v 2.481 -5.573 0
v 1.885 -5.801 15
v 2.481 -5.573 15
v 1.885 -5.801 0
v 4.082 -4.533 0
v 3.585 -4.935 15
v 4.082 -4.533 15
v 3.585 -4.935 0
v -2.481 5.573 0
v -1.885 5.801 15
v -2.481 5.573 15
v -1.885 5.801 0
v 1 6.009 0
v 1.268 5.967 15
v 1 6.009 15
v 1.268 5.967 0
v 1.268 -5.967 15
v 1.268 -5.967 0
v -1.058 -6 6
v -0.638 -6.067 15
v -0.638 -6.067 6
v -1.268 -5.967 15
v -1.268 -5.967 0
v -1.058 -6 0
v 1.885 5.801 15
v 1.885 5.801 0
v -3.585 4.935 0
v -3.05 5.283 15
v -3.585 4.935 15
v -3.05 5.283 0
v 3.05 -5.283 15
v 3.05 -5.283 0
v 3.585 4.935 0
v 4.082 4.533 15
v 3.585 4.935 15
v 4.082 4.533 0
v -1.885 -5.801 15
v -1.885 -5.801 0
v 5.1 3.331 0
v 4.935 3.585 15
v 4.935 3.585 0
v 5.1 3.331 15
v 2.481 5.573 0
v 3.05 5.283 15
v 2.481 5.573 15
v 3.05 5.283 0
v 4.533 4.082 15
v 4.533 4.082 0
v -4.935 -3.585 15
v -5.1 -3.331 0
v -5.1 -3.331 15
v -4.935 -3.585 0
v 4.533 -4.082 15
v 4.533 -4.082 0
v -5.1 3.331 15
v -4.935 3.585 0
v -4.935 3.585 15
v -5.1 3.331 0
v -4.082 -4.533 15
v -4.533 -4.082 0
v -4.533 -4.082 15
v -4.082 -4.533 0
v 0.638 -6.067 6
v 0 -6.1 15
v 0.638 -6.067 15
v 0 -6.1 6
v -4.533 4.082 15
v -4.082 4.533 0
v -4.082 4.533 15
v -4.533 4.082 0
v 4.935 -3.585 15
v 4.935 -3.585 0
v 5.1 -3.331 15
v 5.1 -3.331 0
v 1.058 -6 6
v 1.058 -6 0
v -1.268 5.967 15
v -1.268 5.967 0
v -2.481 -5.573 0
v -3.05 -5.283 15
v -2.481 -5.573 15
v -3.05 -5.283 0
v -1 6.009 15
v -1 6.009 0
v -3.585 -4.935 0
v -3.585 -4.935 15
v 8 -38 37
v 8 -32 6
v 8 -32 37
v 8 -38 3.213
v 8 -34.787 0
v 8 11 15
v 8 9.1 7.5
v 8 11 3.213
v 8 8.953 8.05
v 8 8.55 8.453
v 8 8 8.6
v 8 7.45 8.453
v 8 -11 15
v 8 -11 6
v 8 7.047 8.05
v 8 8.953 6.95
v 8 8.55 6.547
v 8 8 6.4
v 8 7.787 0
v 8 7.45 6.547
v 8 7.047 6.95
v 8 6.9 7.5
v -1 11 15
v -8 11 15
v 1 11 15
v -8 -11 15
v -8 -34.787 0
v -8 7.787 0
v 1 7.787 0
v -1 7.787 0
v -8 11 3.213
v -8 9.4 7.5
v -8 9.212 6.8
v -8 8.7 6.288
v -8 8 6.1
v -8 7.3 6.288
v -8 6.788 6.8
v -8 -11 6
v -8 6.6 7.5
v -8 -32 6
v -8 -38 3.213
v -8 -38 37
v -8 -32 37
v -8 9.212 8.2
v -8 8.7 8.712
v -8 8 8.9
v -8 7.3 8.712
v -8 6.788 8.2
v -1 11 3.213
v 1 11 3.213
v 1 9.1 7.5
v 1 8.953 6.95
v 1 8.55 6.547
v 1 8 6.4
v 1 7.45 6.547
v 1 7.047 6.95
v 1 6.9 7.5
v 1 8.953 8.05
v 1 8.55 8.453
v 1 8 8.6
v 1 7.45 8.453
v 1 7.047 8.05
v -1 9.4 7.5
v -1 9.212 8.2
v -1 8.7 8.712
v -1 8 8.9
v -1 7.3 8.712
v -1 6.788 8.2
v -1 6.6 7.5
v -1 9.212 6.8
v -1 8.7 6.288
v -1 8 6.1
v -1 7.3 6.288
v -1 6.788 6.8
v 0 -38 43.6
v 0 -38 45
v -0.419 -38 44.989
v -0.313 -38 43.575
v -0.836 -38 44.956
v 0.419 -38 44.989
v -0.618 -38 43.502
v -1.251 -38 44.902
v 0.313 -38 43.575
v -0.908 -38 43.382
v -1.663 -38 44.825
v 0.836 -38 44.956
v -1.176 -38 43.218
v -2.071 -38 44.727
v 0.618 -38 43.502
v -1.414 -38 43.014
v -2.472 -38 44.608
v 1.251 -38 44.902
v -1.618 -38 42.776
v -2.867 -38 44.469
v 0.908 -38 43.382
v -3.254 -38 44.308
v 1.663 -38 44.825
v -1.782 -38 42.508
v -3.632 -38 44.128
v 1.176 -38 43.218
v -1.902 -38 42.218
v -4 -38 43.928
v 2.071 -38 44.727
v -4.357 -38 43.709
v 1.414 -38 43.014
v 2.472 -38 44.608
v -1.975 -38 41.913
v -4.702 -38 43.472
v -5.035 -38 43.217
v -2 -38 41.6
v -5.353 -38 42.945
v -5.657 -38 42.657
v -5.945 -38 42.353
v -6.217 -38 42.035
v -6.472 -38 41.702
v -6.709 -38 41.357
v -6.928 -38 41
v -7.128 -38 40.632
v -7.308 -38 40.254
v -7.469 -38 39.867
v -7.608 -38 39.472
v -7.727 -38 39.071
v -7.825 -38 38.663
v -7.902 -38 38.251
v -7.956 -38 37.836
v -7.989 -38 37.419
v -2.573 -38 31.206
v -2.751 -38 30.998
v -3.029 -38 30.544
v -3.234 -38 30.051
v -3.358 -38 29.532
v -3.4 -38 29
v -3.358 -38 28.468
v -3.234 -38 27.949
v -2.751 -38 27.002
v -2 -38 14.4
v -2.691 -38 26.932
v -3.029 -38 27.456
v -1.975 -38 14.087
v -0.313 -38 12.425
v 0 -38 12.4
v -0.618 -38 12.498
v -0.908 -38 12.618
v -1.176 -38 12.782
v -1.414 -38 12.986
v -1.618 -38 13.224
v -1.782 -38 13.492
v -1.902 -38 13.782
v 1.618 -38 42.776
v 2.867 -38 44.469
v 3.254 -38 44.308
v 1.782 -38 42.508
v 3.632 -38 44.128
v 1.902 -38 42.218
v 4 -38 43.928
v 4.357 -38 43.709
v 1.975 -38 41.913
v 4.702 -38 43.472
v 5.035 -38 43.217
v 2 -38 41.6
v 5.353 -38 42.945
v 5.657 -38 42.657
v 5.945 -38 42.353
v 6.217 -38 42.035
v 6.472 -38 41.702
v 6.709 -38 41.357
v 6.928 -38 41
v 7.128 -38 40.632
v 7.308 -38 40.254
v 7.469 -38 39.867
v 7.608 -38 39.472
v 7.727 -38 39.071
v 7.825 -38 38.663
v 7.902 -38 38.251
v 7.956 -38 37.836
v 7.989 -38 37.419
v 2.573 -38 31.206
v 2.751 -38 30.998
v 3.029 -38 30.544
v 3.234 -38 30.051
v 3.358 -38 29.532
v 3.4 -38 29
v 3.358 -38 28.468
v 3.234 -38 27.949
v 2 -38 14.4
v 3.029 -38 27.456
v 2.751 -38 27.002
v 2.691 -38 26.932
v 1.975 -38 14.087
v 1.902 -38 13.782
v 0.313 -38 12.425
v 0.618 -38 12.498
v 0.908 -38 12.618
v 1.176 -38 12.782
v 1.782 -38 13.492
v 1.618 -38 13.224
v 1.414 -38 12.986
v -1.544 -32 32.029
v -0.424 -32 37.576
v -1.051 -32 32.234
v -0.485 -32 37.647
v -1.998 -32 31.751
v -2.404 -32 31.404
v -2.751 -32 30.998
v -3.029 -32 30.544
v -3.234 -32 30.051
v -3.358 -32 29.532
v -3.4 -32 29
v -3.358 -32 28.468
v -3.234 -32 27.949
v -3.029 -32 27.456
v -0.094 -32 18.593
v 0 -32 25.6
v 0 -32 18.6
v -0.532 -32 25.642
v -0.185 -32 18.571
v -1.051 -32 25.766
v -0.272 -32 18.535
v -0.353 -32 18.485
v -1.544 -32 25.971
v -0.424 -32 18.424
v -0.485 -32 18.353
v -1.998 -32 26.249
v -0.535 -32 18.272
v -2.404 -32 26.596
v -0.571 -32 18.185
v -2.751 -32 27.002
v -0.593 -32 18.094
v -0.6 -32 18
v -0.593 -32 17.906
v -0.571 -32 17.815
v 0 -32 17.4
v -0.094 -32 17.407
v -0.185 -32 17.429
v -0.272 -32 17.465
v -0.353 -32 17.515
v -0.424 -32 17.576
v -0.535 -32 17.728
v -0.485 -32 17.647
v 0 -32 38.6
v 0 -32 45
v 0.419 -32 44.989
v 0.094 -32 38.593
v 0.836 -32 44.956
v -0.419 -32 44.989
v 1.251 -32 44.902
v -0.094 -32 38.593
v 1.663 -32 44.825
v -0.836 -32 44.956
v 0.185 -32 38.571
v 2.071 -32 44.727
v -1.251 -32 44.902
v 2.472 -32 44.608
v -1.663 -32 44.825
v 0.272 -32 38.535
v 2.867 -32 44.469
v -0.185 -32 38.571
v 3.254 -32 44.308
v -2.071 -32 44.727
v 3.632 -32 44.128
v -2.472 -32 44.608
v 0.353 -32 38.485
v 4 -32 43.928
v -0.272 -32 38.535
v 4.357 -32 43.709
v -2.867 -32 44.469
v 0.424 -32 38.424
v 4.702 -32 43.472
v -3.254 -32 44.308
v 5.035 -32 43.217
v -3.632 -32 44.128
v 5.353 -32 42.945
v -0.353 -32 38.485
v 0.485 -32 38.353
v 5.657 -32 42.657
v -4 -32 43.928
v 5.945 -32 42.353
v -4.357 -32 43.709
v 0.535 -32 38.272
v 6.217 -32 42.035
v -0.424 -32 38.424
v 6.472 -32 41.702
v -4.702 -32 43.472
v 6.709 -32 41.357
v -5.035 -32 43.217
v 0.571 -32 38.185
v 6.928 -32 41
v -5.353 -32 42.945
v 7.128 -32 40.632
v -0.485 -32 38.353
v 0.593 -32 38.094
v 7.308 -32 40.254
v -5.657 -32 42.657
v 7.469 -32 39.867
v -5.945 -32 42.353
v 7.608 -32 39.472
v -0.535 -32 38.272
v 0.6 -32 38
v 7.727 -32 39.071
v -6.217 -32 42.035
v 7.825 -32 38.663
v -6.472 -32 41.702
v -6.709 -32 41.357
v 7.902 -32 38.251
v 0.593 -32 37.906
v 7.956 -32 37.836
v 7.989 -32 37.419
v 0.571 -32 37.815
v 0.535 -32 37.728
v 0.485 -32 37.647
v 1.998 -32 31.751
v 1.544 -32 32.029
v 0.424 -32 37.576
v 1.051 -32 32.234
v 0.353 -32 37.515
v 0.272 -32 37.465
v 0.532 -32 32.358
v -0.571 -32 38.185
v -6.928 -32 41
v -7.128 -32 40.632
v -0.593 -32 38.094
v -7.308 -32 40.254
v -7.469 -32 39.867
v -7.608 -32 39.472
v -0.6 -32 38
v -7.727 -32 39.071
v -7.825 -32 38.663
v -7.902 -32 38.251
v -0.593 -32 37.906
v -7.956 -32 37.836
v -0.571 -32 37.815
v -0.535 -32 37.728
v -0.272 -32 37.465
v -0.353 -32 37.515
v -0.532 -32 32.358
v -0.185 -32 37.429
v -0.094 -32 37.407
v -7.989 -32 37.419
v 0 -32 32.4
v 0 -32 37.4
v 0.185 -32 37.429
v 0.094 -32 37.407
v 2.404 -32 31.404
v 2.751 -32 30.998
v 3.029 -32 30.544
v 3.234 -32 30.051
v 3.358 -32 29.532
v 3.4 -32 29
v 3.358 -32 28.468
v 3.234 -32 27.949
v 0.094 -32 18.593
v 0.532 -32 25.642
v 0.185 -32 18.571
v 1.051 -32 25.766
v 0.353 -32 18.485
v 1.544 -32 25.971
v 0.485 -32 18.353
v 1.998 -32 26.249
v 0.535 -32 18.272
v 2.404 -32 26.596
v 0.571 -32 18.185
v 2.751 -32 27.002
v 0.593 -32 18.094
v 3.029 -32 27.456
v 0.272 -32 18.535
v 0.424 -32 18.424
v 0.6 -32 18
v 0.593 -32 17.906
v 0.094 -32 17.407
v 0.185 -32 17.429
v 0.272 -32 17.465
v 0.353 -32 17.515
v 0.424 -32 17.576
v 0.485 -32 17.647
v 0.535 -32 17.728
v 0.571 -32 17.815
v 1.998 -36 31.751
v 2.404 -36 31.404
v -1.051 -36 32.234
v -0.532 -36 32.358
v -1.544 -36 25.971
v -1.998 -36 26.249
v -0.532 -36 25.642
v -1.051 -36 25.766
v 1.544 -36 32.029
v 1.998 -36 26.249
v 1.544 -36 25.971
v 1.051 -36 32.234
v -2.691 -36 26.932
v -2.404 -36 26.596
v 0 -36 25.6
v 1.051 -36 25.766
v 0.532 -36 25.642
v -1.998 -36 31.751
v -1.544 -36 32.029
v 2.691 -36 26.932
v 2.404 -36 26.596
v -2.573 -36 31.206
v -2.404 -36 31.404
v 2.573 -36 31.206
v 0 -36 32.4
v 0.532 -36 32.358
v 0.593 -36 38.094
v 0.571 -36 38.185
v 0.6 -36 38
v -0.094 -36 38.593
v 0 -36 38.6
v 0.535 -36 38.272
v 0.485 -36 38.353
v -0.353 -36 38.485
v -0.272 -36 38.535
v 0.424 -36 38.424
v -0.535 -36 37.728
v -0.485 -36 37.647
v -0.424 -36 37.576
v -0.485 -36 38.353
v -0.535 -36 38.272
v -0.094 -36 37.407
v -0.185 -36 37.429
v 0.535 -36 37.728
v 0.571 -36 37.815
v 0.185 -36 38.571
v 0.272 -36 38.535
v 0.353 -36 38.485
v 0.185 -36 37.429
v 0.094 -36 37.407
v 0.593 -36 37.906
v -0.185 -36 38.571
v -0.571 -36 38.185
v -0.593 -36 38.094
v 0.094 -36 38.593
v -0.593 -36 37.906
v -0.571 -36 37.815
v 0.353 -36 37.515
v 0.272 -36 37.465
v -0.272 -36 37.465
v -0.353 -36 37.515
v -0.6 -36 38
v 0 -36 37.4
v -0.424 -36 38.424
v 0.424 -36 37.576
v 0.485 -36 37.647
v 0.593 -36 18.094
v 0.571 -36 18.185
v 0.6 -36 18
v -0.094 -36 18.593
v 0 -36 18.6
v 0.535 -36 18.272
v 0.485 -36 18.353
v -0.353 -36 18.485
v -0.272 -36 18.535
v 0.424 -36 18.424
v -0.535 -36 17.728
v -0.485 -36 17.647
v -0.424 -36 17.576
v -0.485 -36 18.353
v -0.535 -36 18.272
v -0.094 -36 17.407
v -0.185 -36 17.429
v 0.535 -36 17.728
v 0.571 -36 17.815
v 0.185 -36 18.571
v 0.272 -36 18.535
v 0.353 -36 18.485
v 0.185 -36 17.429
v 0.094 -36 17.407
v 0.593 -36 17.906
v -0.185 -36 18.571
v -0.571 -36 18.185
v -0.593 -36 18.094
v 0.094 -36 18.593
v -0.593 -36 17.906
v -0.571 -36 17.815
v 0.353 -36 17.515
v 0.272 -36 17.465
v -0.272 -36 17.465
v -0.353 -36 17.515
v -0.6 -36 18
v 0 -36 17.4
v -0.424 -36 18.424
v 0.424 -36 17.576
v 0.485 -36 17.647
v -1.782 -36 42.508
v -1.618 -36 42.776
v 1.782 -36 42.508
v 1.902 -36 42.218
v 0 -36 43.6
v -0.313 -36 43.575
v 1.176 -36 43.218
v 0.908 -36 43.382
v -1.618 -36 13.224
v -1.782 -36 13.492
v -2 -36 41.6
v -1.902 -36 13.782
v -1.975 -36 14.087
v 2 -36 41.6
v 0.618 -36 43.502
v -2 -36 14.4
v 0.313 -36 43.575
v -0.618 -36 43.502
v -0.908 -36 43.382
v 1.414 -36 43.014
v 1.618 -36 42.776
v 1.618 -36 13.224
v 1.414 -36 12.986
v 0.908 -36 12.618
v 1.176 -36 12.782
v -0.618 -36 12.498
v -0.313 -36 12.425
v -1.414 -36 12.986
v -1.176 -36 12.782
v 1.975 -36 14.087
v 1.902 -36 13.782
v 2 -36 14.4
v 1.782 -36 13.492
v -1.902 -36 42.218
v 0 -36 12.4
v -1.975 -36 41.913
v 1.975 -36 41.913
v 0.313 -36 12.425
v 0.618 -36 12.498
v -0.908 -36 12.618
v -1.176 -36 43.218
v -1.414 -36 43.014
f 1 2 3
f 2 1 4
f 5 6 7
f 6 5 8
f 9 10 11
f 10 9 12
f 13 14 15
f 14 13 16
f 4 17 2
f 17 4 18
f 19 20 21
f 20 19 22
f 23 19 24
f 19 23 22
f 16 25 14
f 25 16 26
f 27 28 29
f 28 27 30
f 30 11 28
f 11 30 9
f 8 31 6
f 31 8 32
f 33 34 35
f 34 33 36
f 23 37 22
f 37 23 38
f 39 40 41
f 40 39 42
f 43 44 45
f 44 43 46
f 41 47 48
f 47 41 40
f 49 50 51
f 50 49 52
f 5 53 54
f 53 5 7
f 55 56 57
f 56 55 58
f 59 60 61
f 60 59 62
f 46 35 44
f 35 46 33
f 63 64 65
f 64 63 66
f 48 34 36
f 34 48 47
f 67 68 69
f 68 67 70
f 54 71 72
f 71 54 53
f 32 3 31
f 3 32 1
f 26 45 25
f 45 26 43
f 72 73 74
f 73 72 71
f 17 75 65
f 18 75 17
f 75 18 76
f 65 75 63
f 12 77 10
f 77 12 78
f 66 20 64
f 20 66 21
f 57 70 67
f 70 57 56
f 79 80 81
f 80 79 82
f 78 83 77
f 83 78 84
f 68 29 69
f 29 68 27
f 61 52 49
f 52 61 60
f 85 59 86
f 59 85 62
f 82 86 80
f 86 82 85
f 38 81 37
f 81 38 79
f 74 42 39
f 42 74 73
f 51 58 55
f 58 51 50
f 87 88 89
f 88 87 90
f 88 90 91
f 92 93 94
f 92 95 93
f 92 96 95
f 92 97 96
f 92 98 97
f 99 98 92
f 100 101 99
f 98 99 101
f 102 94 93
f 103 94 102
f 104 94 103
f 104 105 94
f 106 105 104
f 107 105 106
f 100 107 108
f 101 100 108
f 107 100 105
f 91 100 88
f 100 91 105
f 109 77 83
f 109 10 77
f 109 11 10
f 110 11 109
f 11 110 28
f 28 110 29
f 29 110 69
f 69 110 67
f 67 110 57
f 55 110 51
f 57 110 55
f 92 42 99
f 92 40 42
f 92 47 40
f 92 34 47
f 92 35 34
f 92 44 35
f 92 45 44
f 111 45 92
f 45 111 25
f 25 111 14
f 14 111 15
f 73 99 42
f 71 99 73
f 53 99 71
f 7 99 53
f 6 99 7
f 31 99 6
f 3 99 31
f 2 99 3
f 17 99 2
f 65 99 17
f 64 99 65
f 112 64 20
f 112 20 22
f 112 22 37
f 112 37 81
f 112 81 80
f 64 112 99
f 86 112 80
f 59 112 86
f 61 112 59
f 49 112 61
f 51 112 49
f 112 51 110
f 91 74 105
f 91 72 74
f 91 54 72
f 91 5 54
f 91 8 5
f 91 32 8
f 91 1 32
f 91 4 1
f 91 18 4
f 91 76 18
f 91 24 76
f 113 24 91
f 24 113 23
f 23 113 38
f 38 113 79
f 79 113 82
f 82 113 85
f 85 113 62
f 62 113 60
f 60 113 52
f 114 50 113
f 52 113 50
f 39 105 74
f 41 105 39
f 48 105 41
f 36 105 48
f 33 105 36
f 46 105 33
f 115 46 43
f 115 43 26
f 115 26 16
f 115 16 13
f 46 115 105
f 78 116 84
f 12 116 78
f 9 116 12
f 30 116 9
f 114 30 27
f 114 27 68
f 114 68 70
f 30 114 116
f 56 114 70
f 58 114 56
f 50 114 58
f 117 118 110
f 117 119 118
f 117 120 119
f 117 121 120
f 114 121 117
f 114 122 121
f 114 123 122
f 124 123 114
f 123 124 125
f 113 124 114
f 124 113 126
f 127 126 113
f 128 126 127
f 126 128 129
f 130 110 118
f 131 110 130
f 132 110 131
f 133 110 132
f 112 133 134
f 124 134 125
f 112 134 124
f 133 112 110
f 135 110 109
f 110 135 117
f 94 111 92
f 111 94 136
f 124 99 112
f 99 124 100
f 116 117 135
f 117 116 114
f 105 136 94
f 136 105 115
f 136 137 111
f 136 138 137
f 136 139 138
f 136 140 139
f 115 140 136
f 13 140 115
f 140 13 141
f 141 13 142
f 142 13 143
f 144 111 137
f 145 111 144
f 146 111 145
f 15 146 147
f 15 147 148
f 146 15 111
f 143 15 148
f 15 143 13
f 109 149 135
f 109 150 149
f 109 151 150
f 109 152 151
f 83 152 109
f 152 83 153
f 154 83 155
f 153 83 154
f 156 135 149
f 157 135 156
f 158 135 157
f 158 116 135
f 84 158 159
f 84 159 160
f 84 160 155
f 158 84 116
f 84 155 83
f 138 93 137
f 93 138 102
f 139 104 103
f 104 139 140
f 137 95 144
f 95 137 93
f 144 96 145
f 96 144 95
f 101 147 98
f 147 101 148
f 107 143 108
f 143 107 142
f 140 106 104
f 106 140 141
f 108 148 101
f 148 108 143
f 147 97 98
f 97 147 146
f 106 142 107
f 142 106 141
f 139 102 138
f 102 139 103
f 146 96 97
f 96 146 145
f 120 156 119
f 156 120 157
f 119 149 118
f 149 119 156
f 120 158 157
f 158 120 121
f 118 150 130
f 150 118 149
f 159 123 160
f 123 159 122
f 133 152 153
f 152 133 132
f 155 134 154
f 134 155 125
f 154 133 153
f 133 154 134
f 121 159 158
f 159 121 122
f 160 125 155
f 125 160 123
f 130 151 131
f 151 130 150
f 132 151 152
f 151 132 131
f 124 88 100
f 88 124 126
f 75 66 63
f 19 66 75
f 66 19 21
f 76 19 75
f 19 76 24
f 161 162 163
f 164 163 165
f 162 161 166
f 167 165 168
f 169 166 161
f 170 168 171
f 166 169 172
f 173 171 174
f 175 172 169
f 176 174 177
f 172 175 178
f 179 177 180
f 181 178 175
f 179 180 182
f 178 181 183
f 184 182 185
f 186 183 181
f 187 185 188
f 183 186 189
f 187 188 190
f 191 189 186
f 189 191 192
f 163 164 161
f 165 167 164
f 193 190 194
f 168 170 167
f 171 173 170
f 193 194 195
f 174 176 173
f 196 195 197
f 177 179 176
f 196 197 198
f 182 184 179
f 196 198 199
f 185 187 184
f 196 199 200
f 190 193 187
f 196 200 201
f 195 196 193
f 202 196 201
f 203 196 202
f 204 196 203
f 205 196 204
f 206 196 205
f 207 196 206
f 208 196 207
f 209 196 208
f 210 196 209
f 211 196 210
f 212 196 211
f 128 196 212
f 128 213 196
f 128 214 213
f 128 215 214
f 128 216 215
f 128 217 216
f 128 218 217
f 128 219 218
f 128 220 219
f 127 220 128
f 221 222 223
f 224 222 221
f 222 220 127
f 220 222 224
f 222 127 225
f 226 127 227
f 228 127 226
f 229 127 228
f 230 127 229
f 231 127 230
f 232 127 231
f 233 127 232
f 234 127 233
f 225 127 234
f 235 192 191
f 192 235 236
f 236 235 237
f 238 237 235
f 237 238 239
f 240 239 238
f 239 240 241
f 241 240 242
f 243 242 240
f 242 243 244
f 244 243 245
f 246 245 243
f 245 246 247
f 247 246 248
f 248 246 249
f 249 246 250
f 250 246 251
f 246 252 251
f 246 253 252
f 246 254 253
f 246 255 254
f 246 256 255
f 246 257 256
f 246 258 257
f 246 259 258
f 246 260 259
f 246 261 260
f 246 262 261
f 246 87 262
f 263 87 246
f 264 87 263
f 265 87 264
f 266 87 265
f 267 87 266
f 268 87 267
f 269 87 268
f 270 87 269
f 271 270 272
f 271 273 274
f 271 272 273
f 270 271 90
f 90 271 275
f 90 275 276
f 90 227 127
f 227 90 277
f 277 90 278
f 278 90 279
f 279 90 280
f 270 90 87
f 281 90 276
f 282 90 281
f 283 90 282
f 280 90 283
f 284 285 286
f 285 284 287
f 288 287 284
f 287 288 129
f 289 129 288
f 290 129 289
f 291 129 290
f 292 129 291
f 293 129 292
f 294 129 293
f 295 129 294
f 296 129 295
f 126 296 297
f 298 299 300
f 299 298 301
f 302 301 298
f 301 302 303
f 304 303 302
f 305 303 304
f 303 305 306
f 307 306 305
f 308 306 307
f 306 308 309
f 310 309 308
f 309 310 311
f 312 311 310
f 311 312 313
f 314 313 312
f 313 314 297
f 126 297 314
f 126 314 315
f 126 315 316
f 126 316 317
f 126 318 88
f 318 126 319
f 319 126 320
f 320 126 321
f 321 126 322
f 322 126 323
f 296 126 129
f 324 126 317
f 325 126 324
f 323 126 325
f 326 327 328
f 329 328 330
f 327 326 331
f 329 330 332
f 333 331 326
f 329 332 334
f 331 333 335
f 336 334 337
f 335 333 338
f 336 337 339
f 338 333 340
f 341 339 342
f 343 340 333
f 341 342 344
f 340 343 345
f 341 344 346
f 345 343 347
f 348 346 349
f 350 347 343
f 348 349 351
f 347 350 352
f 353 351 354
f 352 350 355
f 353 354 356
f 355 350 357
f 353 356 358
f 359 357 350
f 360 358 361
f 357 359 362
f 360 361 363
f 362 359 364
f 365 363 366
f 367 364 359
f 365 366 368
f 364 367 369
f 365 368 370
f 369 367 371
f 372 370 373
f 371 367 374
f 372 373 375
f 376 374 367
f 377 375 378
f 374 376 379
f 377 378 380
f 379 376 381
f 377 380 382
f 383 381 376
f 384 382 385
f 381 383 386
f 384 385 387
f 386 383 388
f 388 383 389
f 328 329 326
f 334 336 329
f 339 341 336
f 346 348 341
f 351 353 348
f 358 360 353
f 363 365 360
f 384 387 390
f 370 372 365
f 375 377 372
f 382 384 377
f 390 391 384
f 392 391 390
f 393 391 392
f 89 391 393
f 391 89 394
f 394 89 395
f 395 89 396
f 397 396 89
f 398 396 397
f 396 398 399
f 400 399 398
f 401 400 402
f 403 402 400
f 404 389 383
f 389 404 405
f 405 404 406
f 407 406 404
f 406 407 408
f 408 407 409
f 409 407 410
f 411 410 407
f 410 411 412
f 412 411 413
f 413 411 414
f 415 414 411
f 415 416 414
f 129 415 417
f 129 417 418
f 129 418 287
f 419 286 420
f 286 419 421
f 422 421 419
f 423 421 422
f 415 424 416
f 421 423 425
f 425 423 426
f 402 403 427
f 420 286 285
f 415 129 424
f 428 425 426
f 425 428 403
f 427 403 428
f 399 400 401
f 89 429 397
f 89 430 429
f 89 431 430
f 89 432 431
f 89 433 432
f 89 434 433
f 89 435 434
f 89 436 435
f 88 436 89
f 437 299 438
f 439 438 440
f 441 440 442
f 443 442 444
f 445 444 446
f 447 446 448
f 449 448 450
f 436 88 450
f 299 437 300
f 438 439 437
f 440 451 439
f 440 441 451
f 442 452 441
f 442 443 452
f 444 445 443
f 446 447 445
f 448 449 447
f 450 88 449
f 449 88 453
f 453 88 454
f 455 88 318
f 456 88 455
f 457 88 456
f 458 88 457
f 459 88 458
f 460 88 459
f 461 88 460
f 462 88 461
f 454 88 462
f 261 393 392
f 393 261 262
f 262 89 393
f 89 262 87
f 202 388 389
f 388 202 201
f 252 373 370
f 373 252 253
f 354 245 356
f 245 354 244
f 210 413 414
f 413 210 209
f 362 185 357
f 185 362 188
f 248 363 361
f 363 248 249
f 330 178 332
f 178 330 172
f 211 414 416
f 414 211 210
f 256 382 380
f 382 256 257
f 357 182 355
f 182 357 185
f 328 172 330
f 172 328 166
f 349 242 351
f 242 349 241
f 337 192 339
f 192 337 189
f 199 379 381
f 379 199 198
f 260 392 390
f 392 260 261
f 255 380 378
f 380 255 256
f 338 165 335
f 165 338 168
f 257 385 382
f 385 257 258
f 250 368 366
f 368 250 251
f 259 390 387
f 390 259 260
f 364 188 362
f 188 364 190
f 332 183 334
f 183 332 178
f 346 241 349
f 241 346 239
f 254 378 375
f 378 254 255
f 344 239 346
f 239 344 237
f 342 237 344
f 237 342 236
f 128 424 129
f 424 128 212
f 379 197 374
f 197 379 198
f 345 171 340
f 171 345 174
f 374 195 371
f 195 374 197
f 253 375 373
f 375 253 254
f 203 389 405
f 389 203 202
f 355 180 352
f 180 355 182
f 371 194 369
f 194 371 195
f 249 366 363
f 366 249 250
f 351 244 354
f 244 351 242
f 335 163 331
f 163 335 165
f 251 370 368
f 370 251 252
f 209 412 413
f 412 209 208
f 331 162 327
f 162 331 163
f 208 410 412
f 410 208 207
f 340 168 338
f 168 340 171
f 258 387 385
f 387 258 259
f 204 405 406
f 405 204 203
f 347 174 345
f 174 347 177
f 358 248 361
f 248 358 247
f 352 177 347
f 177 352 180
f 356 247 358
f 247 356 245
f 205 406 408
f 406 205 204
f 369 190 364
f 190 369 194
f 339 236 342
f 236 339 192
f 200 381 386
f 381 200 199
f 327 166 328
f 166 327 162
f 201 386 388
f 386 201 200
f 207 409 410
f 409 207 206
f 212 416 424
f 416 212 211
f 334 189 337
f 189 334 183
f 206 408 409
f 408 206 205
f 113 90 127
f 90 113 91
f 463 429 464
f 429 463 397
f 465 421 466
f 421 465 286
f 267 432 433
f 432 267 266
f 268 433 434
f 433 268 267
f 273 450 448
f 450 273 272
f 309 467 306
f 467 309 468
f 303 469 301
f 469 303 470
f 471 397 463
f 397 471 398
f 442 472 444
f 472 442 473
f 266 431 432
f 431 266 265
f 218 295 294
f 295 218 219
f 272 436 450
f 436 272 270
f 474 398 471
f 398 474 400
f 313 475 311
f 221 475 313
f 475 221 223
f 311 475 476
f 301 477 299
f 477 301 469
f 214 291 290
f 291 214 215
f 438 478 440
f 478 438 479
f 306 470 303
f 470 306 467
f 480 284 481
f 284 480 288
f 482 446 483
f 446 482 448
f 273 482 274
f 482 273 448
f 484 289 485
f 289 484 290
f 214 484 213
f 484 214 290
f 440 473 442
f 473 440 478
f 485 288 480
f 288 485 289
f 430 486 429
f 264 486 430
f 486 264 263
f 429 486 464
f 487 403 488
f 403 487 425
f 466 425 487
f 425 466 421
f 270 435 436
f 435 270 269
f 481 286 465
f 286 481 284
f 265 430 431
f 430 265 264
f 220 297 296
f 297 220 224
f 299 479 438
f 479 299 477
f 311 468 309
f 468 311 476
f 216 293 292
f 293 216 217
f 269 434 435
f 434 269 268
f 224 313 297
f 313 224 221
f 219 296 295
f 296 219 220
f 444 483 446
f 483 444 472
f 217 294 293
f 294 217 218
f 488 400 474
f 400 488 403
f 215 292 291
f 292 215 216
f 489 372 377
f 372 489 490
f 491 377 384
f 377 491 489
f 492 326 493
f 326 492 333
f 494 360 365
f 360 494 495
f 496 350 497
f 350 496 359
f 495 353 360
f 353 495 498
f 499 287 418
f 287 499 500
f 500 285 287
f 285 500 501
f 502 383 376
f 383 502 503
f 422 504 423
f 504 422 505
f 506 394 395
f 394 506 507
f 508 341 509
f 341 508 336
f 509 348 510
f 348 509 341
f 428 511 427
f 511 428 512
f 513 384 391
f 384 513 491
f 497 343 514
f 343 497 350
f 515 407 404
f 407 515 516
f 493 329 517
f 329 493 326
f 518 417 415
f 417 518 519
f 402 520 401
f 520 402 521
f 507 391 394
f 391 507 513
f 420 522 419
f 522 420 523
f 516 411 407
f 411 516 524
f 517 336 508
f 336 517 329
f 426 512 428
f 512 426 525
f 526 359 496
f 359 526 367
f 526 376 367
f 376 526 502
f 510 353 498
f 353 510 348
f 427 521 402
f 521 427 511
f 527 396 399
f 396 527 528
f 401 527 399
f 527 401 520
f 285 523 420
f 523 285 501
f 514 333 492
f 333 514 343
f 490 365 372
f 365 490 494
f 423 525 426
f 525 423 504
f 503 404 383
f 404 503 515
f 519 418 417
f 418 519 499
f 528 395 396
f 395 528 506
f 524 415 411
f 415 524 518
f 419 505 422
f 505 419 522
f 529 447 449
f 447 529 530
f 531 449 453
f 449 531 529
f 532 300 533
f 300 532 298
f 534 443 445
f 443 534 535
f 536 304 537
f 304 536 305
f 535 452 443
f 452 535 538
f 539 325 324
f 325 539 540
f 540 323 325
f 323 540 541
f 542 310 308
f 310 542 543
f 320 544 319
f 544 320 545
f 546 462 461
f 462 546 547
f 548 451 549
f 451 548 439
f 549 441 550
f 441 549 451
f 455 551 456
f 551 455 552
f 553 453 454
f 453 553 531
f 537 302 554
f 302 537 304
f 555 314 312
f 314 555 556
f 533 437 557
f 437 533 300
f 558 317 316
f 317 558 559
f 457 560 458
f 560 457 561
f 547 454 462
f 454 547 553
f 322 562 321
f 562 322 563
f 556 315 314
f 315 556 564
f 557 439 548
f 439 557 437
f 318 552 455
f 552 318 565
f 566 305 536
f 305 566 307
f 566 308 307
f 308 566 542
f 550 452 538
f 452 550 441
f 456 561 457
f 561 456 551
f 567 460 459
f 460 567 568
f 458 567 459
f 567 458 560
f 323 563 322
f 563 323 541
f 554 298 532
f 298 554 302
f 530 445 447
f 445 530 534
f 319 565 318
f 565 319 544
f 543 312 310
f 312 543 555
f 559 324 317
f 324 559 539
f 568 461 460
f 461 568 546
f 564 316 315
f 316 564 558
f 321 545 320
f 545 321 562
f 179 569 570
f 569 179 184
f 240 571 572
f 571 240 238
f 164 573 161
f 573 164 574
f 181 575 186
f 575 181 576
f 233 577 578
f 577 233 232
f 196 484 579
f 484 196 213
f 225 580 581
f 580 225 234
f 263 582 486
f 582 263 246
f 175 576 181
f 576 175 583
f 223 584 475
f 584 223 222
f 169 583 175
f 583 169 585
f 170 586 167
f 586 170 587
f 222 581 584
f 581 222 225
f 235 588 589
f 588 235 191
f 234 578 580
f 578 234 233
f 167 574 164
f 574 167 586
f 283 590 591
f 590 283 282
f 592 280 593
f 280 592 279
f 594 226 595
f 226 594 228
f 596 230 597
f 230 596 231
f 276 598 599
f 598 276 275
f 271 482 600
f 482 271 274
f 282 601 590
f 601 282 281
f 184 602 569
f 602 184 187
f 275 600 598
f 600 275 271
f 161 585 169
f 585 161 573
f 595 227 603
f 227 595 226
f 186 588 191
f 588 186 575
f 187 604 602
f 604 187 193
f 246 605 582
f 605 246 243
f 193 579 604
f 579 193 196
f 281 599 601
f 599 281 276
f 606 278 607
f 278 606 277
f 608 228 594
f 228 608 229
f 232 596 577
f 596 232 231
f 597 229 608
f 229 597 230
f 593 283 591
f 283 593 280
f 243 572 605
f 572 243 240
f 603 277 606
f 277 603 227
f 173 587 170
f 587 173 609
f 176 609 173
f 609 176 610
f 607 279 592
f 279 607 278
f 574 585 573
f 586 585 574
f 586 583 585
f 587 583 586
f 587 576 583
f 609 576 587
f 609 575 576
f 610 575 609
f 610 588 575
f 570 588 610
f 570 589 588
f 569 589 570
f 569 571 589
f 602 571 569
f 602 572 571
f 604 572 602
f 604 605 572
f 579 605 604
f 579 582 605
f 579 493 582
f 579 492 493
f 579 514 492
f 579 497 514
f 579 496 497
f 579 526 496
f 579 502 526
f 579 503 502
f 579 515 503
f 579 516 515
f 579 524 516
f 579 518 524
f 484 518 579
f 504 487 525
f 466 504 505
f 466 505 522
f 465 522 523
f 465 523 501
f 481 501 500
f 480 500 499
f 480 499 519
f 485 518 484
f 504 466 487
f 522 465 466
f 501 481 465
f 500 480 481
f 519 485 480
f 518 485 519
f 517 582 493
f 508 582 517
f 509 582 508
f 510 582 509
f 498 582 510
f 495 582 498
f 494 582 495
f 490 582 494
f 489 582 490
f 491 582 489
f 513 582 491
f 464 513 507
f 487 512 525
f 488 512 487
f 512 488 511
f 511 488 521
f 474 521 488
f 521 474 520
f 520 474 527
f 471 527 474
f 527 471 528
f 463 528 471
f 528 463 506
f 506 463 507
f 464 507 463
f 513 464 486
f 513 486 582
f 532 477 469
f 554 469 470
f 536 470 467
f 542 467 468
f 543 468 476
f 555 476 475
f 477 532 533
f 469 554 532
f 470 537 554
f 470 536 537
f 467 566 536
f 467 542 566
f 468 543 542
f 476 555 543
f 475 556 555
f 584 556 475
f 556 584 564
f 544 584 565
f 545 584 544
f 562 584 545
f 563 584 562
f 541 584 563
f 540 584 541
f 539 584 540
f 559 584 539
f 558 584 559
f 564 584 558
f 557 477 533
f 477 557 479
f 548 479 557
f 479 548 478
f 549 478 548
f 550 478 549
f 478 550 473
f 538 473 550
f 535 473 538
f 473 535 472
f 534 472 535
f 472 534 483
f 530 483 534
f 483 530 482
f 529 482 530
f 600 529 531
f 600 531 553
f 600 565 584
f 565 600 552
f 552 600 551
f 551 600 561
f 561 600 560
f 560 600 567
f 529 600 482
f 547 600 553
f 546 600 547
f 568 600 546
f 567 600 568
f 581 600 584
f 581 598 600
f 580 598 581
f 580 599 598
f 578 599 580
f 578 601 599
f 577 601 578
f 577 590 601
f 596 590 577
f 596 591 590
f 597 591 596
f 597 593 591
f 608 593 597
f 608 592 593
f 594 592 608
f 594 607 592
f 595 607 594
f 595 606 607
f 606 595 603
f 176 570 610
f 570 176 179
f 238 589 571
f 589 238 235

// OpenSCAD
difference(){
translate([-8,-11,0])cube([16,22,15]);
difference(){
    translate([0,0,-1])cylinder(d=12.2,h=25,$fn=60);
    translate([6.1,0,-1])cube([2,16,40],center=true);
    translate([-6.1,0,-1])cube([2,16,40],center=true);
}
translate([0,14,-15])rotate([45,0,0])cube(30,center=true);
translate([-1,0,-1])cube([2,22,25]);
translate([-9,8,7.5])rotate([0,90,0])
cylinder(d=2.2,h=21,$fn=12);
translate([-9,8,7.5])rotate([0,90,0])
cylinder(d=2.8,h=10,$fn=12);
}

difference(){
union(){
translate([-8,-38,0])cube([16,32,6]);
translate([-8,-38,0])cube([16,6,37]);
translate([0,-32,37])rotate([90,0,0])
cylinder(d=16,h=6,$fn=120);
}
translate([0,-56,0])rotate([45,0,0])cube(30,center=true);
translate([0,-31,29])rotate([90,0,0])
cylinder(d=6.8,h=8,$fn=40);
translate([0,-31,38])rotate([90,0,0])
cylinder(d=1.2,h=8,$fn=40);
translate([0,-31,18])rotate([90,0,0])
cylinder(d=1.2,h=8,$fn=40);
translate([0,-36,28])rotate([90,0,0])
hull(){
cylinder(d=5.5,h=7,$fn=40);
translate([0,13.6,0])cylinder(d=4,h=7,$fn=40);
translate([0,-13.6,0])cylinder(d=4,h=7,$fn=40);
}  
}
